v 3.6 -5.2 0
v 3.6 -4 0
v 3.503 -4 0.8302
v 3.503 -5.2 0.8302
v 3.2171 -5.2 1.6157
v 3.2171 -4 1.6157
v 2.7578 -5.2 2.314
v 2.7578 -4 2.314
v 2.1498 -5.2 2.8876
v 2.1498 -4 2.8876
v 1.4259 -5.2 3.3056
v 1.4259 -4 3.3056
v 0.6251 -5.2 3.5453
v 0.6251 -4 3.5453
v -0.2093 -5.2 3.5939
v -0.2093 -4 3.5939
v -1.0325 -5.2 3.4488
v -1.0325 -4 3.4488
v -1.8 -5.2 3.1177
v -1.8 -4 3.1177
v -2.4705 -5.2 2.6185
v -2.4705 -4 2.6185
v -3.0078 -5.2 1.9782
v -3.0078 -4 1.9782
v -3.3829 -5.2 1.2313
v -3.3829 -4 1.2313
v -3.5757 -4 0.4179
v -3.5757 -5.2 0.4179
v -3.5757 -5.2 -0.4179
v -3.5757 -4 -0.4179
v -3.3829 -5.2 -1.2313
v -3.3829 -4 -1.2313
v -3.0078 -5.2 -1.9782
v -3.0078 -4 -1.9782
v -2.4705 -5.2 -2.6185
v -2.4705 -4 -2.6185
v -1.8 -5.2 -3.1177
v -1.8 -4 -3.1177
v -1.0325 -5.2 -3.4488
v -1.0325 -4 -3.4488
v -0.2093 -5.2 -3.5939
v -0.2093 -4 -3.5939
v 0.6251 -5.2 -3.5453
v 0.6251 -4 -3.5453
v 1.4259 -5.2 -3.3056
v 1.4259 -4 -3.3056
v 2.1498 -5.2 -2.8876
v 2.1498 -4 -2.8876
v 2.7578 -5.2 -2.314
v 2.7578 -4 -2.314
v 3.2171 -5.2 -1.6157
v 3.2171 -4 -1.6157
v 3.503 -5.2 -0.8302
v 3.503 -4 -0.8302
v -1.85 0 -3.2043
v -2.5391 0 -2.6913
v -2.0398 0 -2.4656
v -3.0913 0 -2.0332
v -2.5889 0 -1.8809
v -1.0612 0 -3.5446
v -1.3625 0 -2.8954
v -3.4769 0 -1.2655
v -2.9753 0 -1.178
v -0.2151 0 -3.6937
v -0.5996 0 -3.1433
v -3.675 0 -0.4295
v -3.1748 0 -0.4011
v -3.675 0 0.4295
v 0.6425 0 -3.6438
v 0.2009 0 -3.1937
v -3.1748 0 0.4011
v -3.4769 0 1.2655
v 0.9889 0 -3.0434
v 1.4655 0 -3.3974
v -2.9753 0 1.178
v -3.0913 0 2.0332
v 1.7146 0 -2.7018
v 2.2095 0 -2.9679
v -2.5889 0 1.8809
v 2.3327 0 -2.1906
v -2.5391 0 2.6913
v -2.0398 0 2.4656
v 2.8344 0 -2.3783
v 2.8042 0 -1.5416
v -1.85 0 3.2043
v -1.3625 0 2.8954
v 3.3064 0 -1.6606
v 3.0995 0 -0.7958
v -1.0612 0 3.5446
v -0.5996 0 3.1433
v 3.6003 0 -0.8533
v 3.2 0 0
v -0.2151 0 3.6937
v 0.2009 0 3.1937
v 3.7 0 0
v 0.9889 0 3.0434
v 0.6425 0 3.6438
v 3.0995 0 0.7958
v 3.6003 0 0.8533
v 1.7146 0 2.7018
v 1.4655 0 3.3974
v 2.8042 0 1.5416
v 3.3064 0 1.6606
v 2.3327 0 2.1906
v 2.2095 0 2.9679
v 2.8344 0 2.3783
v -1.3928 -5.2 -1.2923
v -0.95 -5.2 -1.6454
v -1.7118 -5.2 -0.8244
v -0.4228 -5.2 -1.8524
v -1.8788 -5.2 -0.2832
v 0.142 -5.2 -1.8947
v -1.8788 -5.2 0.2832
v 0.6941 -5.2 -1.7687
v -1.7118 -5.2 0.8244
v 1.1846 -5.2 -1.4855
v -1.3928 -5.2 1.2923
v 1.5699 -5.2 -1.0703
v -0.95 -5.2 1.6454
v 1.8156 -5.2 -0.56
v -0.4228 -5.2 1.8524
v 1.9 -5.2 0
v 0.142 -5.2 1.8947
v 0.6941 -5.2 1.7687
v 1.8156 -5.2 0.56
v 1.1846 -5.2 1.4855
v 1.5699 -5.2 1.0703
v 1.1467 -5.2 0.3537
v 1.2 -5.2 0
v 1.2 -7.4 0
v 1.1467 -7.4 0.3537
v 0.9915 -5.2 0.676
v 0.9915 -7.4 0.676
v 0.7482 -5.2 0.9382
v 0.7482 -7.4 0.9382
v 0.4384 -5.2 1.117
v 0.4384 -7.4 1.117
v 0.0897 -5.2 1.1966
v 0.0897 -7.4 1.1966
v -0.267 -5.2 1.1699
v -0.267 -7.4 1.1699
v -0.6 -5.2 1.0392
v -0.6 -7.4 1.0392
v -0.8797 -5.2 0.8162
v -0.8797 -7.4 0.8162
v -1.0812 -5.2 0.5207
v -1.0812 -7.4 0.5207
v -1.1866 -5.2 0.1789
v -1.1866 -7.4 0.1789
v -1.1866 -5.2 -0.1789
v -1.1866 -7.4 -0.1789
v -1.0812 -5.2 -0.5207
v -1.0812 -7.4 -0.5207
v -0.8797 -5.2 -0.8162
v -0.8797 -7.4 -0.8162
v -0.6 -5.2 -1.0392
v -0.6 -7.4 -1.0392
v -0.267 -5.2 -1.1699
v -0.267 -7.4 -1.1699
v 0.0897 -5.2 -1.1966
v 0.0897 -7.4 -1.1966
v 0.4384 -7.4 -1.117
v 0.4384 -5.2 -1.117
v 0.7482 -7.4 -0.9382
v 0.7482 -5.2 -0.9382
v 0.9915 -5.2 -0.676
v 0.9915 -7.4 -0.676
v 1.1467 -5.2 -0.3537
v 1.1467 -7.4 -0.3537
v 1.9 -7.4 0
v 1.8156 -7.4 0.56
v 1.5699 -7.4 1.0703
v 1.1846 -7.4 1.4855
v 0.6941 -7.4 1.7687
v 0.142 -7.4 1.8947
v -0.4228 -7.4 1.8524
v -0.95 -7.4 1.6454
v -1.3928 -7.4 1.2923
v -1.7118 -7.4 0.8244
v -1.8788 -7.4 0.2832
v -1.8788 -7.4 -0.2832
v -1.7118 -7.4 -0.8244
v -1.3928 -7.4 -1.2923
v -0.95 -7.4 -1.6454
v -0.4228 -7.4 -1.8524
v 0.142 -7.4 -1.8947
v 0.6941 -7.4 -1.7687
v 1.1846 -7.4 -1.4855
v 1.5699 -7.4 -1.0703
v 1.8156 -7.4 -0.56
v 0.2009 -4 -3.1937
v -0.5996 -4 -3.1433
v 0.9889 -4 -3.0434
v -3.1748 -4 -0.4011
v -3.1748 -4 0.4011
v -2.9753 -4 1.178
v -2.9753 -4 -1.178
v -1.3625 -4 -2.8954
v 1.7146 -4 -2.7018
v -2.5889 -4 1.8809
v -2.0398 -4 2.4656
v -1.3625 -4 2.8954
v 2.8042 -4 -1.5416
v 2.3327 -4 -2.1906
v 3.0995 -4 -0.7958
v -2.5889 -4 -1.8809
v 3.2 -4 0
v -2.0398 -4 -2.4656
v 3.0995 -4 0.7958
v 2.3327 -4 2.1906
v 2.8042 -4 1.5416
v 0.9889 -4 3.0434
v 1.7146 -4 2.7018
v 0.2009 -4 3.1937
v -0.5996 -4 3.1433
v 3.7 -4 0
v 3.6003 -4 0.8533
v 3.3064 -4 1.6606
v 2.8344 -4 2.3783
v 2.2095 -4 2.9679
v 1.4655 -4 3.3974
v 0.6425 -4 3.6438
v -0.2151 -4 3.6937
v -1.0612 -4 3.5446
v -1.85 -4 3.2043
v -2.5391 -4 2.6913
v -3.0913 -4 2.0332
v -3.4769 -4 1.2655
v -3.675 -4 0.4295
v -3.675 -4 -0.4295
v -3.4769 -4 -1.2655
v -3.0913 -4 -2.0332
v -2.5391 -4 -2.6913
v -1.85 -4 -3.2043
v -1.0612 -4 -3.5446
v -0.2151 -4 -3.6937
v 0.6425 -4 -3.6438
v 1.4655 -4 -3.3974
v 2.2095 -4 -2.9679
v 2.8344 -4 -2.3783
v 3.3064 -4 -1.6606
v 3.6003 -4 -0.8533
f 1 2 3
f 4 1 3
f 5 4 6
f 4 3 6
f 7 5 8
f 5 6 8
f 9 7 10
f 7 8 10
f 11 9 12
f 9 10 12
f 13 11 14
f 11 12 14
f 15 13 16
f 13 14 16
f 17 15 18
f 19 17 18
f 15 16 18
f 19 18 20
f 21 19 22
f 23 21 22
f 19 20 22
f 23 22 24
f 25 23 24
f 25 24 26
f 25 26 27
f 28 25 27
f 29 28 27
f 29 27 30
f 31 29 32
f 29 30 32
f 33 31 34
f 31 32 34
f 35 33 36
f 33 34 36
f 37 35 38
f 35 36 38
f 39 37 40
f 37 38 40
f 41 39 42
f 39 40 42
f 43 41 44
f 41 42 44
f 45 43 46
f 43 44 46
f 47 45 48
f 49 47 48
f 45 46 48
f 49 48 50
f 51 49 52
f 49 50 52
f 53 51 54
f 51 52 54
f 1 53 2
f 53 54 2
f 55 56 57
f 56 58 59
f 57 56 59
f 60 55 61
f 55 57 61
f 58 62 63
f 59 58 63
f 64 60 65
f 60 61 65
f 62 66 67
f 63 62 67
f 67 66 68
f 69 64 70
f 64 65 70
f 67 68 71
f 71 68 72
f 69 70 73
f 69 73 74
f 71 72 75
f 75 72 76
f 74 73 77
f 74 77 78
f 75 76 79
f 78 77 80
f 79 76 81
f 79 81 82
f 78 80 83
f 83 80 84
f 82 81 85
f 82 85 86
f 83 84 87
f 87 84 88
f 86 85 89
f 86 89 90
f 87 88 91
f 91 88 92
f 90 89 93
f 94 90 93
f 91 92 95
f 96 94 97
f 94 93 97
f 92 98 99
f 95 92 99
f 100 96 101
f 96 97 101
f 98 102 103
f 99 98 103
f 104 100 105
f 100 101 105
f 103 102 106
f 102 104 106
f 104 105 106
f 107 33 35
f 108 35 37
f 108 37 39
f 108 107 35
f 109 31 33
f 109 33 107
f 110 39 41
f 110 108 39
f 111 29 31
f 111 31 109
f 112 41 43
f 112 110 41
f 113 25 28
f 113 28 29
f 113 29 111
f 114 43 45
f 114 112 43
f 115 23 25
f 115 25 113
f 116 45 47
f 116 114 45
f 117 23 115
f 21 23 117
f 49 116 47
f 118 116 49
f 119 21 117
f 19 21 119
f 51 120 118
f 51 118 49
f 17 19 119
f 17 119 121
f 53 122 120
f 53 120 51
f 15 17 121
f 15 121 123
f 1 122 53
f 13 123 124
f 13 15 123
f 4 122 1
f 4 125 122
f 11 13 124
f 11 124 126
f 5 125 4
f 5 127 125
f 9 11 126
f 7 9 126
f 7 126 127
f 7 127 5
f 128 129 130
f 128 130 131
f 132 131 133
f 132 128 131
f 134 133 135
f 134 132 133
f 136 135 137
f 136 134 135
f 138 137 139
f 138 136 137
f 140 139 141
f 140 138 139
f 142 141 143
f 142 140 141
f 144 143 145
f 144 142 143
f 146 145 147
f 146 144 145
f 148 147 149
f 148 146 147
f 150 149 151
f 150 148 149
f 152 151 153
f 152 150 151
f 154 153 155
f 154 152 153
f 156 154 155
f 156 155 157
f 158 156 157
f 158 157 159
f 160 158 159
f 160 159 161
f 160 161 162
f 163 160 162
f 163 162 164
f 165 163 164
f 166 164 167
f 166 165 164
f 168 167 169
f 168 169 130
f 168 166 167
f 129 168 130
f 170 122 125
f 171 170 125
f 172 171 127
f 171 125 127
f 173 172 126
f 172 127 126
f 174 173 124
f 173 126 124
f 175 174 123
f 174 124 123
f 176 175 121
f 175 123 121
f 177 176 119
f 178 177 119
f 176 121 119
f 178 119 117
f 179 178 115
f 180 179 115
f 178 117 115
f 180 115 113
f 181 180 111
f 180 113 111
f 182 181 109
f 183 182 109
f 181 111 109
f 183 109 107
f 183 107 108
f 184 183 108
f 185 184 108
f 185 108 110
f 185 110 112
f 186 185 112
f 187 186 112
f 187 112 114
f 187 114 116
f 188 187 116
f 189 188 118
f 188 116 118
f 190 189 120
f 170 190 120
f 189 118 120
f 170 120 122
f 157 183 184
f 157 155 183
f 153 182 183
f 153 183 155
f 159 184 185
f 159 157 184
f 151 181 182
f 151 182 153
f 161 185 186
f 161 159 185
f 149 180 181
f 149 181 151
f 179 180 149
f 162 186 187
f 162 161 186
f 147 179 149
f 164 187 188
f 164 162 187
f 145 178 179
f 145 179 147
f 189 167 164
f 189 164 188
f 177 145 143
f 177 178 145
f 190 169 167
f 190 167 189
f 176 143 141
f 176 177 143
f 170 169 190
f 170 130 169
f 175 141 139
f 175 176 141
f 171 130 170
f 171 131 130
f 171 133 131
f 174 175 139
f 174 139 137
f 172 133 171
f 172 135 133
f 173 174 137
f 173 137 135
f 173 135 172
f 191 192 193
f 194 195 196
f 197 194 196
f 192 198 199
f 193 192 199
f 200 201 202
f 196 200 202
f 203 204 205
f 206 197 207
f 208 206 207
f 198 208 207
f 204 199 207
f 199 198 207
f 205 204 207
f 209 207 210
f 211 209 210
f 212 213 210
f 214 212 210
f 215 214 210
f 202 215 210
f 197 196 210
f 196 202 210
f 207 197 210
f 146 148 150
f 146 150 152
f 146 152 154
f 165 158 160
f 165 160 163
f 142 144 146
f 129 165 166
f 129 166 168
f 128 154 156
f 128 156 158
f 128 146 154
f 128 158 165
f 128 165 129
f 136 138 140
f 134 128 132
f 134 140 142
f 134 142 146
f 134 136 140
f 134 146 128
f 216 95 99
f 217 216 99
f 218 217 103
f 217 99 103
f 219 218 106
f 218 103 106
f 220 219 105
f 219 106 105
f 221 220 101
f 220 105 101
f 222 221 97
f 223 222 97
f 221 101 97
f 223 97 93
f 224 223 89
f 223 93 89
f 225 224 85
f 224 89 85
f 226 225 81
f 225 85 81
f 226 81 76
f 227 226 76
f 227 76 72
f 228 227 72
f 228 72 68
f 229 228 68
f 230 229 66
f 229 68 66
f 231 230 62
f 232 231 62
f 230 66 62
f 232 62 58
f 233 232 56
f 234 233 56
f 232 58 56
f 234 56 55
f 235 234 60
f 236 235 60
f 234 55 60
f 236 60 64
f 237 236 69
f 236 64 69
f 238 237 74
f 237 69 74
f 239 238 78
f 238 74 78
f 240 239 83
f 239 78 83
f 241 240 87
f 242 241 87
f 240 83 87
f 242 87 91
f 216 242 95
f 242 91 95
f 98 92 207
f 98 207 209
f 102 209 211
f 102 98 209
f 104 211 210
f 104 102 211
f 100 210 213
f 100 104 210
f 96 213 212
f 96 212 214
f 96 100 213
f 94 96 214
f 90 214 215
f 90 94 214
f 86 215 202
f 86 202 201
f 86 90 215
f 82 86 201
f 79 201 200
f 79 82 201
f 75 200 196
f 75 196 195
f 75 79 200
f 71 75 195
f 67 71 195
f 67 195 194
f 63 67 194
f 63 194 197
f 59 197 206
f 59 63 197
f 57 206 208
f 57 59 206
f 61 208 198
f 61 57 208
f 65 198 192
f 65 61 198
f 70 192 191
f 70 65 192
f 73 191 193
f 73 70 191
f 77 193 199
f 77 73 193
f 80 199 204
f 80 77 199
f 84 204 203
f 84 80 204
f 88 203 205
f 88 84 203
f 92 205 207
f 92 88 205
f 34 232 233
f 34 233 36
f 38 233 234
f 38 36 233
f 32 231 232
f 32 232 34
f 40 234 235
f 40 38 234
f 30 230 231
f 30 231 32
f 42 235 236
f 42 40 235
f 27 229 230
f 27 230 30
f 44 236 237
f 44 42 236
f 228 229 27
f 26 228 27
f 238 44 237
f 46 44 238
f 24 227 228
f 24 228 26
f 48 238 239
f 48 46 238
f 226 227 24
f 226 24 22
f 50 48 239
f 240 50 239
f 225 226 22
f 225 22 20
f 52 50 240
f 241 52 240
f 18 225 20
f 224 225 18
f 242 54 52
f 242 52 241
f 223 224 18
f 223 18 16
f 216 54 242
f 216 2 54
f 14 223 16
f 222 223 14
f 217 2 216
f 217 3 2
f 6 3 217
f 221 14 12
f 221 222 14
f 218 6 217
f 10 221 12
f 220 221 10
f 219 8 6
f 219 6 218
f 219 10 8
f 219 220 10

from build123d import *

# Parameters (mm, degrees)
F0_R     = 3.7
F0_R_2   = 3.2
F1_DEPTH = 4
F2_R     = 3.6
F3_DEPTH = 1.2
F4_R     = 1.9
F4_R_2   = 1.2
F5_DEPTH = 2.2


with BuildPart() as f1:
    # F0 (on Front) → F1 (new body)
    with BuildSketch(Plane.XZ):
        Circle(F0_R)
        Circle(F0_R_2, mode=Mode.SUBTRACT)
    extrude(amount=F1_DEPTH)

    # F2 (on face) → F3 (join)
    with BuildSketch(Plane.XZ.offset(4)):
        Circle(F2_R)
    extrude(amount=F3_DEPTH)

    # F4 (on face) → F5 (join)
    with BuildSketch(Plane.XZ.offset(5.2)):
        Circle(F4_R)
        Circle(F4_R_2, mode=Mode.SUBTRACT)
    extrude(amount=F5_DEPTH)


solid = f1.part
